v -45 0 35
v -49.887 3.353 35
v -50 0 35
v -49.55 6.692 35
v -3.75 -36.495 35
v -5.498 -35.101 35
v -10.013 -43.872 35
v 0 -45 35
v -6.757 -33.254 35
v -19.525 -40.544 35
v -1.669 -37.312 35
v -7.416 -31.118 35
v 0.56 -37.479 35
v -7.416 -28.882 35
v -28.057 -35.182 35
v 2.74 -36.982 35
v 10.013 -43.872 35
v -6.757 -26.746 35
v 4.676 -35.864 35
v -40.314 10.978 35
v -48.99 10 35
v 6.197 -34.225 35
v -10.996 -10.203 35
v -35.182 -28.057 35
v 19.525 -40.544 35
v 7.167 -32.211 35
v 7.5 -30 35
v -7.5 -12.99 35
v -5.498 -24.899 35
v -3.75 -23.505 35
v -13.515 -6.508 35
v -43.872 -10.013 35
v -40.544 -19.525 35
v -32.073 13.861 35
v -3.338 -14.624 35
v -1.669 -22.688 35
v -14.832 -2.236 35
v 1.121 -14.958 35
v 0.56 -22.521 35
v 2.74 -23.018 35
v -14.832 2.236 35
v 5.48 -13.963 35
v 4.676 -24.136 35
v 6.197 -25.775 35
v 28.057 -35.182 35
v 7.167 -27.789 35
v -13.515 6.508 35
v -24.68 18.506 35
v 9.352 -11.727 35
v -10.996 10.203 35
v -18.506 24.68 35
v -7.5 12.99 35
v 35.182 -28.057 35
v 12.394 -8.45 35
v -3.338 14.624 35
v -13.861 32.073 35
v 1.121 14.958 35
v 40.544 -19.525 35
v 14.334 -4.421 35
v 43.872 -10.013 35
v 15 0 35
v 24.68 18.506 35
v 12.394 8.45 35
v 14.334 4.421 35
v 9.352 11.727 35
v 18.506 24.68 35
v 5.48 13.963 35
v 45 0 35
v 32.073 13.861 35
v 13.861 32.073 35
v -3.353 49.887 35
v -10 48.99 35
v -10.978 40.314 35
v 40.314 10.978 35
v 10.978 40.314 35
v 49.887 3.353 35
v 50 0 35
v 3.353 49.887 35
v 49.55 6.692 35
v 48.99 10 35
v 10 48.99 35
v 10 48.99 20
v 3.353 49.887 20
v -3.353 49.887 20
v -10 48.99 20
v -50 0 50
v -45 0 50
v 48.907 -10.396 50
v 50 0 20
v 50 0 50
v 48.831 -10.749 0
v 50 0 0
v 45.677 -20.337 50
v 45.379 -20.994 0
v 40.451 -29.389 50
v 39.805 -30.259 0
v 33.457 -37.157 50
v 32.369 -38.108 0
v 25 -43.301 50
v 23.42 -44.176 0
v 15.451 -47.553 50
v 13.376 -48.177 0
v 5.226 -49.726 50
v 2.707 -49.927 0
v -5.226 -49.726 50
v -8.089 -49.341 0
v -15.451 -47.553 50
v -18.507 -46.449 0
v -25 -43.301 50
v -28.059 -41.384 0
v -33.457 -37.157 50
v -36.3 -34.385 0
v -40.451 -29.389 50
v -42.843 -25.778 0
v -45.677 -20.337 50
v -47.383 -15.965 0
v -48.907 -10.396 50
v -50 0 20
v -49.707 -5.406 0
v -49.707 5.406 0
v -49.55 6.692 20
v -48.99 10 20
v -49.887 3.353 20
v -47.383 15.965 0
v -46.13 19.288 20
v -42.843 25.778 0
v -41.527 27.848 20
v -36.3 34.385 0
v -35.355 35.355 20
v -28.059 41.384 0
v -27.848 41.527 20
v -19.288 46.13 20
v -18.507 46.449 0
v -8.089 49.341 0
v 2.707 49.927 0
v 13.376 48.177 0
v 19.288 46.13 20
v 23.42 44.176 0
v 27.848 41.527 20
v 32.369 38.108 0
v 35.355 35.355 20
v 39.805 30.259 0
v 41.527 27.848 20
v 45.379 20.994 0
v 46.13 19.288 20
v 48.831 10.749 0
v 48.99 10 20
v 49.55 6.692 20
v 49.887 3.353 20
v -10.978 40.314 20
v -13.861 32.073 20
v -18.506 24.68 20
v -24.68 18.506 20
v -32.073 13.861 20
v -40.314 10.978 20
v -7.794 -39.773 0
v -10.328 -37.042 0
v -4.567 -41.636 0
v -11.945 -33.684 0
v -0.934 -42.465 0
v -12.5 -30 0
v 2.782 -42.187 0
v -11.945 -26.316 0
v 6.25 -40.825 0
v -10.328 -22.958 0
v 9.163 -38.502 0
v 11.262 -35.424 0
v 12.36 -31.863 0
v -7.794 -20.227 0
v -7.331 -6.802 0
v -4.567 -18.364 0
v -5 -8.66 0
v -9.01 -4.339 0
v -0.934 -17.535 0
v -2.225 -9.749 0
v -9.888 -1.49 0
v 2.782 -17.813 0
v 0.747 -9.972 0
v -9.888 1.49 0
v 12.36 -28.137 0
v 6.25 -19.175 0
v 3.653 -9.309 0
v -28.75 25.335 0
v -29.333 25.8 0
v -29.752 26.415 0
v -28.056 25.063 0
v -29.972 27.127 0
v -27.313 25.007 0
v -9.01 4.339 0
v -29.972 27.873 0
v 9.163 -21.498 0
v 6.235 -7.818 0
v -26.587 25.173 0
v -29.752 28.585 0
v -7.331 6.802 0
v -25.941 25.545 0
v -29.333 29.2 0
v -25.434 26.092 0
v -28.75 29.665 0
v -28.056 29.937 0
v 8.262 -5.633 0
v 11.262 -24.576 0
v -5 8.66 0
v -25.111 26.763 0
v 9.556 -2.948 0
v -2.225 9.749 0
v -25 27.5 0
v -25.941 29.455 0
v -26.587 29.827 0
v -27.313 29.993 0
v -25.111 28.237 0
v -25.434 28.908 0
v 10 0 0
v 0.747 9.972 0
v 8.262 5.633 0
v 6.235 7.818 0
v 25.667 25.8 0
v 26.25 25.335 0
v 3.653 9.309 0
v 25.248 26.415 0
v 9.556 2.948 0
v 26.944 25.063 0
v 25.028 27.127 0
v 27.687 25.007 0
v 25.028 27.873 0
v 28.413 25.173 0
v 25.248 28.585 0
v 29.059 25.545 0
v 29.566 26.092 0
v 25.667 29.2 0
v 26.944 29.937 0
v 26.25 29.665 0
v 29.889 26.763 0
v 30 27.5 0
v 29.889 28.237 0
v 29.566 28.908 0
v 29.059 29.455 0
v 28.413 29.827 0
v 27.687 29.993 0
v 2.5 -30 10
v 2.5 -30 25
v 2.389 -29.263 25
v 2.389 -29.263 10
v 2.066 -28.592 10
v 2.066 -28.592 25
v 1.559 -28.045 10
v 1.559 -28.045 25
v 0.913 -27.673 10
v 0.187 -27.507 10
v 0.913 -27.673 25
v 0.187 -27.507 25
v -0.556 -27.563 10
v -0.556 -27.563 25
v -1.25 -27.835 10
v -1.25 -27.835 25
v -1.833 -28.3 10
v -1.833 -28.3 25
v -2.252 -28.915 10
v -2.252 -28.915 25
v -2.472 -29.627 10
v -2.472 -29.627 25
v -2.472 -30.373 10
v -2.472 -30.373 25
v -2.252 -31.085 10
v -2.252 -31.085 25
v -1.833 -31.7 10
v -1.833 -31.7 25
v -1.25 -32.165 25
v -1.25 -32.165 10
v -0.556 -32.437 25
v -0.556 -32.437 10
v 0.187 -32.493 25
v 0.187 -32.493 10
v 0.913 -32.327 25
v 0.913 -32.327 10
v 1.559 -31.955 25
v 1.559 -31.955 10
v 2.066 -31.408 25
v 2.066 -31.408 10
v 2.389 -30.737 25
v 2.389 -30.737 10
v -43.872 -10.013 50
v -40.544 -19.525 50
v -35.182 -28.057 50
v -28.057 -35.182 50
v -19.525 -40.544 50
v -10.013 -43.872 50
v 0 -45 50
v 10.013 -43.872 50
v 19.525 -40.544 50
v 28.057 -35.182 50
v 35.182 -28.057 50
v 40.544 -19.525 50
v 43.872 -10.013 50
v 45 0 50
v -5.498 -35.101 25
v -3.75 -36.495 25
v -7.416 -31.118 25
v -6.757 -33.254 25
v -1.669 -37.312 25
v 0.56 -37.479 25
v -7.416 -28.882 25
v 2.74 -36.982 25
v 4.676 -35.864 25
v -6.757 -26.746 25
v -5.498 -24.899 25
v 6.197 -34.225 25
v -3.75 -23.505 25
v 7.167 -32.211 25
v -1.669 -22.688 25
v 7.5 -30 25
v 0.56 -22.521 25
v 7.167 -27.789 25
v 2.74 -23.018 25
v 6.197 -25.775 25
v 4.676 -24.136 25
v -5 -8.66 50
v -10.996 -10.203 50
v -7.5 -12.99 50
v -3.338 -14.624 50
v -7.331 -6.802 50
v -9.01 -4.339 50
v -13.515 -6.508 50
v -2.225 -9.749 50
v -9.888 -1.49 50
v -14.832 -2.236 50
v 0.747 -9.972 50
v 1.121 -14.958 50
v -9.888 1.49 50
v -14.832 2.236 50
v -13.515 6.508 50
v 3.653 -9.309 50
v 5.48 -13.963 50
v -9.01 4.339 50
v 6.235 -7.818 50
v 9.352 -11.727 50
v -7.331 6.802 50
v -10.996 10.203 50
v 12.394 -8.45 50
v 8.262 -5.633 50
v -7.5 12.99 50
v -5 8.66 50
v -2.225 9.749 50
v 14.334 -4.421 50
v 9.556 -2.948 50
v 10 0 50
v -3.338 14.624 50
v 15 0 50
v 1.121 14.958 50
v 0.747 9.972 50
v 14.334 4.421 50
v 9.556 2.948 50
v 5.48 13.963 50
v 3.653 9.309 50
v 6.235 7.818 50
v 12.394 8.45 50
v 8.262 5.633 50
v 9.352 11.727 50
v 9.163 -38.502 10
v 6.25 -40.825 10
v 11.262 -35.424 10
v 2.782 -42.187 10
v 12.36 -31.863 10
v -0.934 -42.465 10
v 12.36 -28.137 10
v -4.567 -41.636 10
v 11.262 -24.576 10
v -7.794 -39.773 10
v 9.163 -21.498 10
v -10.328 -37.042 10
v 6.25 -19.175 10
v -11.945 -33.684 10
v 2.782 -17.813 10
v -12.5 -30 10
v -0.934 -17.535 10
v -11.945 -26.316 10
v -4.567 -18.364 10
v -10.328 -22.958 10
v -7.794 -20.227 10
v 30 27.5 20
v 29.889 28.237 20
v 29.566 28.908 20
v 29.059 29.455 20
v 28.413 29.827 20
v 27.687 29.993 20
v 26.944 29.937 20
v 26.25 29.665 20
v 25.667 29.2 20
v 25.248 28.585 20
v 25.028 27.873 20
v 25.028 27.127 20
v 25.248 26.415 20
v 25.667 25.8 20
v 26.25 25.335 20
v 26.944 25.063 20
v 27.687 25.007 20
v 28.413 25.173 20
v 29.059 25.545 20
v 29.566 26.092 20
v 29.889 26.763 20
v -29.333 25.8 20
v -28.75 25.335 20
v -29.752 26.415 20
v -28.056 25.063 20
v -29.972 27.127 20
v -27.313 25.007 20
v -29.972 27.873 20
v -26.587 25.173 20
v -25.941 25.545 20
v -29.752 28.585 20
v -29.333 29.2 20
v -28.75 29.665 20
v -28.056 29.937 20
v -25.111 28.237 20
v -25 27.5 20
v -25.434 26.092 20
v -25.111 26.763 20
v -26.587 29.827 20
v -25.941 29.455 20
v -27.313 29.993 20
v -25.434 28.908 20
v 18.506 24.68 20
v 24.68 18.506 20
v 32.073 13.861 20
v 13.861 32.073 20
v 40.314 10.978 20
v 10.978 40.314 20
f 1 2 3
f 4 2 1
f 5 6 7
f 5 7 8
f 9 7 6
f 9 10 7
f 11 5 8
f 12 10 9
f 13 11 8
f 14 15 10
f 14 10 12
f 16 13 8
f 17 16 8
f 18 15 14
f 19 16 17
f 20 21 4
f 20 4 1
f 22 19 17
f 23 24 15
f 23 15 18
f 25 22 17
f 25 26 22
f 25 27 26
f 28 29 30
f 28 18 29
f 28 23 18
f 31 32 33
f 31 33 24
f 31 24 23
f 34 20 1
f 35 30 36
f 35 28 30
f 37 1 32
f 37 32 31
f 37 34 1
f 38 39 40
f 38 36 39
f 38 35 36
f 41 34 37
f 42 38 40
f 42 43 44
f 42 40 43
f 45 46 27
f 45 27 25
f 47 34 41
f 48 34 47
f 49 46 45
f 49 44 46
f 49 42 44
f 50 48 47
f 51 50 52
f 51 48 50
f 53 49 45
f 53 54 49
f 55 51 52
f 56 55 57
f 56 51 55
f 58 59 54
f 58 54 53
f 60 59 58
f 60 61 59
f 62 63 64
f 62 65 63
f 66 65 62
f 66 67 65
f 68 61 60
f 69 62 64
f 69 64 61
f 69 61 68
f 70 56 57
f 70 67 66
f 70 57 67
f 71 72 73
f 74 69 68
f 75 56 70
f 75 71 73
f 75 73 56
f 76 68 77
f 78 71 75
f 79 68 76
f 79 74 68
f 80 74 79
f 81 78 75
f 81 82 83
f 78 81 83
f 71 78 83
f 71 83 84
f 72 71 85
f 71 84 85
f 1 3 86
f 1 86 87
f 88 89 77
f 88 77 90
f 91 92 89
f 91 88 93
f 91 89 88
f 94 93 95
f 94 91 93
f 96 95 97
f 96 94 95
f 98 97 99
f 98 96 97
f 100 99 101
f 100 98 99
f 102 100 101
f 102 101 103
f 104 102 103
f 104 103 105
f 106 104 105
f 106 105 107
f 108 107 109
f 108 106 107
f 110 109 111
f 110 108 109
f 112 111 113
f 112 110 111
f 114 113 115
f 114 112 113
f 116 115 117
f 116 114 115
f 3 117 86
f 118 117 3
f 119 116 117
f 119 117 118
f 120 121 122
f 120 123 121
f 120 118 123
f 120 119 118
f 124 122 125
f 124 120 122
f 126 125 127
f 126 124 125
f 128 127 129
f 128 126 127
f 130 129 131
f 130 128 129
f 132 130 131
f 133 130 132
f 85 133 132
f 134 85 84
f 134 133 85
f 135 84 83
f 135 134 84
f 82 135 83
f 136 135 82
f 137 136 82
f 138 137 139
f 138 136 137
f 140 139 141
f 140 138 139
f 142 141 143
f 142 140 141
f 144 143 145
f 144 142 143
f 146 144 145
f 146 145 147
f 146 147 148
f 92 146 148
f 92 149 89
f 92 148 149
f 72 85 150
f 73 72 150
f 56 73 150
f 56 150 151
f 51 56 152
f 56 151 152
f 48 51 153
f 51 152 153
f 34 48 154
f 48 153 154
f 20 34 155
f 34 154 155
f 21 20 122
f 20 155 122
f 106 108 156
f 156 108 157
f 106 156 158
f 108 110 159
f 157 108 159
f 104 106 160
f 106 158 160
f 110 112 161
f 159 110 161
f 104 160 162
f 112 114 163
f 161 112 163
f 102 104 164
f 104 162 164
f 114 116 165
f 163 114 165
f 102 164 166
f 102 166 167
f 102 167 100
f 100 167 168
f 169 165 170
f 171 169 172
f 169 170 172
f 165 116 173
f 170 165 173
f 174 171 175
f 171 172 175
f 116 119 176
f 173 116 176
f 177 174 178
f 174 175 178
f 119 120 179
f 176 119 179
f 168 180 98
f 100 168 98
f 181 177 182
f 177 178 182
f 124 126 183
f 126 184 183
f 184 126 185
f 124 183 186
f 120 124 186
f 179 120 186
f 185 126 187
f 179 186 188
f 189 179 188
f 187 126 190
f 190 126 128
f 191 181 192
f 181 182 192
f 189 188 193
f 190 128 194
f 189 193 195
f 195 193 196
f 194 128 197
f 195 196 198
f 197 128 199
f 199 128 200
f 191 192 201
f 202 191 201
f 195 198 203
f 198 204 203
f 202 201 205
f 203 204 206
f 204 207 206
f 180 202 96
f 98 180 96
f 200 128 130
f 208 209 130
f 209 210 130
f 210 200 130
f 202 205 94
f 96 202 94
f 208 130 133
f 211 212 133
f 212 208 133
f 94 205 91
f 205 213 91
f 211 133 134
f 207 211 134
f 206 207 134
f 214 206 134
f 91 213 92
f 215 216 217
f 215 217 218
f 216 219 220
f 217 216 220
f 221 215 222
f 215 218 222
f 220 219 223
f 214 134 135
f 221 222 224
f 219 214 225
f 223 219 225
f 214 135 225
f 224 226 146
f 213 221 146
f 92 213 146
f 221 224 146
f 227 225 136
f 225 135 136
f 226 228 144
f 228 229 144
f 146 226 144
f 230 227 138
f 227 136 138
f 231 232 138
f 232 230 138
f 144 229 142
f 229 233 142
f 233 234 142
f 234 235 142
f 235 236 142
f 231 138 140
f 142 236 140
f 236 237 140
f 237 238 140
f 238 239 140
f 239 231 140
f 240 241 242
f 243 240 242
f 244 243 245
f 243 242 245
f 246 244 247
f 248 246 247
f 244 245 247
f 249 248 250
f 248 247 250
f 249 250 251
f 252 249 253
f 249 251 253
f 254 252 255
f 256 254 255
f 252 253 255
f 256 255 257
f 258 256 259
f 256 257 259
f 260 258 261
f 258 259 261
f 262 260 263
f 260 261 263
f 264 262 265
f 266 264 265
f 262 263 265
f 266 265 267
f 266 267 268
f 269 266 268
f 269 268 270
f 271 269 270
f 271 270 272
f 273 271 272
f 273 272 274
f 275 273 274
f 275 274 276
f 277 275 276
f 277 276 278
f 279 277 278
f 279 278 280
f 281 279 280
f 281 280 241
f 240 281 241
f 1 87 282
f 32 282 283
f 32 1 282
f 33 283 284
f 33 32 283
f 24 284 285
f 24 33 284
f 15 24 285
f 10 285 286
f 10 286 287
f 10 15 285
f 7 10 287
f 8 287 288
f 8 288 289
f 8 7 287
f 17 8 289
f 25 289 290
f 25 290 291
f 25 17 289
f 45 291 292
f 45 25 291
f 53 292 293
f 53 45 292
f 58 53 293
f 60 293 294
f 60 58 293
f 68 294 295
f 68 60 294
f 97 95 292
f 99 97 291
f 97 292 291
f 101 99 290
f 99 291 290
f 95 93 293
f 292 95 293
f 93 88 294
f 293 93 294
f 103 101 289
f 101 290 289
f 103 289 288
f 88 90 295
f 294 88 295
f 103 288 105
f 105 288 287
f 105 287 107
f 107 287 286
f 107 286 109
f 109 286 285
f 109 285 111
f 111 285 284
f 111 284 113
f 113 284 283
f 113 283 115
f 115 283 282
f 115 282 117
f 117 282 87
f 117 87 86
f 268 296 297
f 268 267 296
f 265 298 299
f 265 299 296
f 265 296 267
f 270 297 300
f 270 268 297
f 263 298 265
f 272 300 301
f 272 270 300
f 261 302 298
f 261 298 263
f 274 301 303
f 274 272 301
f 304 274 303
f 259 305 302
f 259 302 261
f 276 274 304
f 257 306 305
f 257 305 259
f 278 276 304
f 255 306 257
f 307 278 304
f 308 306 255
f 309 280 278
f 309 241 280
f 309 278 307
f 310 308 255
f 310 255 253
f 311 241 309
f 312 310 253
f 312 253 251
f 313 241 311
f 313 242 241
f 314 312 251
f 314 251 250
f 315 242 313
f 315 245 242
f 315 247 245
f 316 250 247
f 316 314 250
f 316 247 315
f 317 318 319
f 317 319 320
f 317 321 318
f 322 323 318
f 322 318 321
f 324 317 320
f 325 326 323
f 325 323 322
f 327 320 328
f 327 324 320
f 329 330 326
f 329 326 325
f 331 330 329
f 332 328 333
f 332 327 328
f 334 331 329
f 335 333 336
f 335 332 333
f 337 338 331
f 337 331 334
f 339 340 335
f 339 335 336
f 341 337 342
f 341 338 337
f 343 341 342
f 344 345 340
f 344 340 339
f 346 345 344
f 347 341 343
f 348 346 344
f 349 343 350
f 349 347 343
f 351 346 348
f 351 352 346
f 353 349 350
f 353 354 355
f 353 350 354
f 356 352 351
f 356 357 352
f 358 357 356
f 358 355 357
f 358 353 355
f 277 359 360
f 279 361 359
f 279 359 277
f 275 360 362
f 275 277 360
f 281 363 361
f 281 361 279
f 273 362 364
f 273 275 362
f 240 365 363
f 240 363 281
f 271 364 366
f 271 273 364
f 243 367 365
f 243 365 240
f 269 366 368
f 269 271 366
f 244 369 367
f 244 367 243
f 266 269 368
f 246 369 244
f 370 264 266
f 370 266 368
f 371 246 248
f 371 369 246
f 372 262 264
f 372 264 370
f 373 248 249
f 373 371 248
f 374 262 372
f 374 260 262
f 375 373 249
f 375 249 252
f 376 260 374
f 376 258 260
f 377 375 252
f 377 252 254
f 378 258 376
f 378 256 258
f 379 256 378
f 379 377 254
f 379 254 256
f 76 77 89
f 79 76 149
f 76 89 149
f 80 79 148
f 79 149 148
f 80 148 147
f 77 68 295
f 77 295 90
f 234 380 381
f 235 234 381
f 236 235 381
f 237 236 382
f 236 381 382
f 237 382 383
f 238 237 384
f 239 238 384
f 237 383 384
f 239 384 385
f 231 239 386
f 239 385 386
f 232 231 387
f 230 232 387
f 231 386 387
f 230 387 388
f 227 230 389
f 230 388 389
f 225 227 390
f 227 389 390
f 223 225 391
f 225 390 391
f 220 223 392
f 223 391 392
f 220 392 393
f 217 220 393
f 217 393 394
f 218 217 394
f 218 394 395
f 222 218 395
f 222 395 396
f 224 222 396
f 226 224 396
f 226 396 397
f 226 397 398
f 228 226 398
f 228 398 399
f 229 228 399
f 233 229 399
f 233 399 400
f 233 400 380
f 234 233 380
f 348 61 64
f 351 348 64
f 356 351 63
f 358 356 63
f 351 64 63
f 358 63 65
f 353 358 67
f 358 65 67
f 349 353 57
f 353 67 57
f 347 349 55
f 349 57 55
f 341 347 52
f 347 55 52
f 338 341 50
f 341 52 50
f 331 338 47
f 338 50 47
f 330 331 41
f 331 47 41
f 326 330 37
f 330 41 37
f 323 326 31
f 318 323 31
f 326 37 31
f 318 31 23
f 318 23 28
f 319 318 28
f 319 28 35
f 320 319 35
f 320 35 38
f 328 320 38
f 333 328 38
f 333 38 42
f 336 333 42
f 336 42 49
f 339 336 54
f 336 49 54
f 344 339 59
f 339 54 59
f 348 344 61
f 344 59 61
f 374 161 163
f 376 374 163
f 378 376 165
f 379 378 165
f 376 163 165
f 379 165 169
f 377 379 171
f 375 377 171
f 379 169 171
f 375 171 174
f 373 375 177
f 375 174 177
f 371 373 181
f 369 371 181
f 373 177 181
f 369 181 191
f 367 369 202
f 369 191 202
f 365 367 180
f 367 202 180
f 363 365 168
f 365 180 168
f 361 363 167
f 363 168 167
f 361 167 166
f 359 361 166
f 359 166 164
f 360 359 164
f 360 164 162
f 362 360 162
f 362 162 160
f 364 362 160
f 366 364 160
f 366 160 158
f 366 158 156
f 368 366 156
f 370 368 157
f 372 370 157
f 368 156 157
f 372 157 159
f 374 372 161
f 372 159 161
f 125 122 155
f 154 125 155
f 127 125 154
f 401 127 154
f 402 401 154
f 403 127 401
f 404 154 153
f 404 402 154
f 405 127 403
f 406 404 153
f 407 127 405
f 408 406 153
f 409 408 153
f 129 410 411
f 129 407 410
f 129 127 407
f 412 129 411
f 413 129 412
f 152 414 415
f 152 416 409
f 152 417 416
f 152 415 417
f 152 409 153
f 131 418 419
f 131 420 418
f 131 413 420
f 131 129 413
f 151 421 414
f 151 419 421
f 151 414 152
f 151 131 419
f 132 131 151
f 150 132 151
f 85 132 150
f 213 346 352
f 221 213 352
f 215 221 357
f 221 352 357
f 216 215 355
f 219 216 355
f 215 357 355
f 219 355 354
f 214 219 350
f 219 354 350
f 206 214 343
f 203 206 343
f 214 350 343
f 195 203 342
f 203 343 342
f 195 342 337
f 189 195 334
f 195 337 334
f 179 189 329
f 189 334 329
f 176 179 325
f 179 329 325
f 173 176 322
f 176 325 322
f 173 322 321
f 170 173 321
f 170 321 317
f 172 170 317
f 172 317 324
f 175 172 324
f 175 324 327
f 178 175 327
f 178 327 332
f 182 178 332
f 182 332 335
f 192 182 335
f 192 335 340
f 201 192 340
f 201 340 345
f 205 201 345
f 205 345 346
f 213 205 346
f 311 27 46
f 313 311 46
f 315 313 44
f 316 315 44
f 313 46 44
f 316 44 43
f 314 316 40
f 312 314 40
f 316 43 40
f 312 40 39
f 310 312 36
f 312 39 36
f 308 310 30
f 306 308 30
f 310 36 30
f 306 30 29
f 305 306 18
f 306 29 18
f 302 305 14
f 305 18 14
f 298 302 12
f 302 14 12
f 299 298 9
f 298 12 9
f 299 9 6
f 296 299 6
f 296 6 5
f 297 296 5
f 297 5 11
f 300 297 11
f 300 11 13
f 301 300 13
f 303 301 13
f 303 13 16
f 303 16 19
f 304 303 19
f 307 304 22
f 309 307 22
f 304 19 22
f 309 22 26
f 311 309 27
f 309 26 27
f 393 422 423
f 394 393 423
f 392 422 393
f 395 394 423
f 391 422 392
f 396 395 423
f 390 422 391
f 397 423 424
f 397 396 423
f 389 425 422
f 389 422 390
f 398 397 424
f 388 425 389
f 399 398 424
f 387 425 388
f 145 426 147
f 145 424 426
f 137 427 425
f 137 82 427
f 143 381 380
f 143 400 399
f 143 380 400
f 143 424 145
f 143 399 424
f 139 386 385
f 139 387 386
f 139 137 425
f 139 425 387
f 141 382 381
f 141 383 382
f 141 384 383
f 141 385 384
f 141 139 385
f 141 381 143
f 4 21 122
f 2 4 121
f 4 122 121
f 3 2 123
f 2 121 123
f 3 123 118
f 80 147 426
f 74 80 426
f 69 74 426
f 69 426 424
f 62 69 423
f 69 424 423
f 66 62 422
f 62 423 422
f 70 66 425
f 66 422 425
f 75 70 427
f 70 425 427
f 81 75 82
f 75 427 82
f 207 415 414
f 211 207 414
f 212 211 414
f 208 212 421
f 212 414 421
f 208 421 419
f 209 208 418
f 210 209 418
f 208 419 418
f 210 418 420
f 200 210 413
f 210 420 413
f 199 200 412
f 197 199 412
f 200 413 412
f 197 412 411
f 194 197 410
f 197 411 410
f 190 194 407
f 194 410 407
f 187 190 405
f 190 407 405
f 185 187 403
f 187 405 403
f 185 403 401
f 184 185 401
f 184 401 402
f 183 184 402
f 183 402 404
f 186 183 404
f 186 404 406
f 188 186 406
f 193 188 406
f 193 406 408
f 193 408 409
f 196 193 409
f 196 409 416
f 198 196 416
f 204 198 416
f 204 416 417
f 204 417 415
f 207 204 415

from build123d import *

# Parameters (mm, degrees)
SKETCH1_R           = 50
BOSS_EXTRUDE1_DEPTH = 20
BOSS_EXTRUDE3_DEPTH = 30
BOSS_EXTRUDE7_DEPTH = 15
SKETCH5_R           = 2.5
CUT_EXTRUDE1_DEPTH  = 43
SKETCH8_R           = 7.5
CUT_EXTRUDE4_DEPTH  = 10
SKETCH9_R           = 2.5
CUT_EXTRUDE5_DEPTH  = 90
SKETCH10_R          = 12.5
CUT_EXTRUDE6_DEPTH  = 10
SKETCH11_R          = 15
BOSS_EXTRUDE8_DEPTH = 15
SKETCH12_R          = 10
CUT_EXTRUDE7_DEPTH  = 105


with BuildPart() as part:
    # Sketch1 → Boss-Extrude1 (new body)
    with BuildSketch(Plane.XY):
        Circle(SKETCH1_R)
    extrude(amount=BOSS_EXTRUDE1_DEPTH)

    # Sketch2 → Boss-Extrude3 (add)
    with BuildSketch(Plane.XY.offset(20)):
        with BuildLine():
            Line((-50, 0), (-45, 0))
            ThreePointArc((-45, 0), (0, -45), (45, 0))
            Line((45, 0), (50, 0))
            ThreePointArc((50, 0), (0, -50), (-50, 0))
        make_face()
    extrude(amount=BOSS_EXTRUDE3_DEPTH)

    # Sketch4 → Boss-Extrude7 (add)
    with BuildSketch(Plane.XY.offset(20)):
        with BuildLine():
            ThreePointArc((-48.989794856, 10), (-49.74680765, 5.0254481), (-50, 0))
            Line((-50, 0), (-45, 0))
            ThreePointArc((-45, 0), (0, -45), (45, 0))
            Line((45, 0), (50, 0))
            ThreePointArc((50, 0), (49.74680765, 5.0254481), (48.989794856, 10))
            ThreePointArc((48.989794856, 10), (21.419846516, 21.419846516), (10, 48.989794856))
            ThreePointArc((10, 48.989794856), (0, 50), (-10, 48.989794856))
            ThreePointArc((-10, 48.989794856), (-21.419846516, 21.419846516), (-48.989794856, 10))
        make_face()
    extrude(amount=BOSS_EXTRUDE7_DEPTH)

    # Sketch5 → Cut-Extrude1 (cut)
    with BuildSketch(Plane.XY.offset(20)):
        with Locations((-27.5, 27.5)):
            Circle(SKETCH5_R)
        with Locations((27.5, 27.5)):
            Circle(SKETCH5_R)
    extrude(amount=-CUT_EXTRUDE1_DEPTH, mode=Mode.SUBTRACT)

    # Sketch8 → Cut-Extrude4 (cut)
    with BuildSketch(Plane.XY.offset(35)):
        with Locations((0, -30)):
            Circle(SKETCH8_R)
    extrude(amount=-CUT_EXTRUDE4_DEPTH, mode=Mode.SUBTRACT)

    # Sketch9 → Cut-Extrude5 (cut)
    with BuildSketch(Plane.XY.offset(25)):
        with Locations((0, -30)):
            Circle(SKETCH9_R)
    extrude(amount=-CUT_EXTRUDE5_DEPTH, mode=Mode.SUBTRACT)

    # Sketch10 → Cut-Extrude6 (cut)
    with BuildSketch(Plane(origin=(0, 0, 0), x_dir=(-1, 0, 0), z_dir=(0, 0, -1))):
        with Locations((0, -30)):
            Circle(SKETCH10_R)
    extrude(amount=-CUT_EXTRUDE6_DEPTH, mode=Mode.SUBTRACT)

    # Sketch11 → Boss-Extrude8 (add)
    with BuildSketch(Plane.XY.offset(35)):
        Circle(SKETCH11_R)
    extrude(amount=BOSS_EXTRUDE8_DEPTH)

    # Sketch12 → Cut-Extrude7 (cut)
    with BuildSketch(Plane.XY.offset(50)):
        Circle(SKETCH12_R)
    extrude(amount=-CUT_EXTRUDE7_DEPTH, mode=Mode.SUBTRACT)


solid = part.part
